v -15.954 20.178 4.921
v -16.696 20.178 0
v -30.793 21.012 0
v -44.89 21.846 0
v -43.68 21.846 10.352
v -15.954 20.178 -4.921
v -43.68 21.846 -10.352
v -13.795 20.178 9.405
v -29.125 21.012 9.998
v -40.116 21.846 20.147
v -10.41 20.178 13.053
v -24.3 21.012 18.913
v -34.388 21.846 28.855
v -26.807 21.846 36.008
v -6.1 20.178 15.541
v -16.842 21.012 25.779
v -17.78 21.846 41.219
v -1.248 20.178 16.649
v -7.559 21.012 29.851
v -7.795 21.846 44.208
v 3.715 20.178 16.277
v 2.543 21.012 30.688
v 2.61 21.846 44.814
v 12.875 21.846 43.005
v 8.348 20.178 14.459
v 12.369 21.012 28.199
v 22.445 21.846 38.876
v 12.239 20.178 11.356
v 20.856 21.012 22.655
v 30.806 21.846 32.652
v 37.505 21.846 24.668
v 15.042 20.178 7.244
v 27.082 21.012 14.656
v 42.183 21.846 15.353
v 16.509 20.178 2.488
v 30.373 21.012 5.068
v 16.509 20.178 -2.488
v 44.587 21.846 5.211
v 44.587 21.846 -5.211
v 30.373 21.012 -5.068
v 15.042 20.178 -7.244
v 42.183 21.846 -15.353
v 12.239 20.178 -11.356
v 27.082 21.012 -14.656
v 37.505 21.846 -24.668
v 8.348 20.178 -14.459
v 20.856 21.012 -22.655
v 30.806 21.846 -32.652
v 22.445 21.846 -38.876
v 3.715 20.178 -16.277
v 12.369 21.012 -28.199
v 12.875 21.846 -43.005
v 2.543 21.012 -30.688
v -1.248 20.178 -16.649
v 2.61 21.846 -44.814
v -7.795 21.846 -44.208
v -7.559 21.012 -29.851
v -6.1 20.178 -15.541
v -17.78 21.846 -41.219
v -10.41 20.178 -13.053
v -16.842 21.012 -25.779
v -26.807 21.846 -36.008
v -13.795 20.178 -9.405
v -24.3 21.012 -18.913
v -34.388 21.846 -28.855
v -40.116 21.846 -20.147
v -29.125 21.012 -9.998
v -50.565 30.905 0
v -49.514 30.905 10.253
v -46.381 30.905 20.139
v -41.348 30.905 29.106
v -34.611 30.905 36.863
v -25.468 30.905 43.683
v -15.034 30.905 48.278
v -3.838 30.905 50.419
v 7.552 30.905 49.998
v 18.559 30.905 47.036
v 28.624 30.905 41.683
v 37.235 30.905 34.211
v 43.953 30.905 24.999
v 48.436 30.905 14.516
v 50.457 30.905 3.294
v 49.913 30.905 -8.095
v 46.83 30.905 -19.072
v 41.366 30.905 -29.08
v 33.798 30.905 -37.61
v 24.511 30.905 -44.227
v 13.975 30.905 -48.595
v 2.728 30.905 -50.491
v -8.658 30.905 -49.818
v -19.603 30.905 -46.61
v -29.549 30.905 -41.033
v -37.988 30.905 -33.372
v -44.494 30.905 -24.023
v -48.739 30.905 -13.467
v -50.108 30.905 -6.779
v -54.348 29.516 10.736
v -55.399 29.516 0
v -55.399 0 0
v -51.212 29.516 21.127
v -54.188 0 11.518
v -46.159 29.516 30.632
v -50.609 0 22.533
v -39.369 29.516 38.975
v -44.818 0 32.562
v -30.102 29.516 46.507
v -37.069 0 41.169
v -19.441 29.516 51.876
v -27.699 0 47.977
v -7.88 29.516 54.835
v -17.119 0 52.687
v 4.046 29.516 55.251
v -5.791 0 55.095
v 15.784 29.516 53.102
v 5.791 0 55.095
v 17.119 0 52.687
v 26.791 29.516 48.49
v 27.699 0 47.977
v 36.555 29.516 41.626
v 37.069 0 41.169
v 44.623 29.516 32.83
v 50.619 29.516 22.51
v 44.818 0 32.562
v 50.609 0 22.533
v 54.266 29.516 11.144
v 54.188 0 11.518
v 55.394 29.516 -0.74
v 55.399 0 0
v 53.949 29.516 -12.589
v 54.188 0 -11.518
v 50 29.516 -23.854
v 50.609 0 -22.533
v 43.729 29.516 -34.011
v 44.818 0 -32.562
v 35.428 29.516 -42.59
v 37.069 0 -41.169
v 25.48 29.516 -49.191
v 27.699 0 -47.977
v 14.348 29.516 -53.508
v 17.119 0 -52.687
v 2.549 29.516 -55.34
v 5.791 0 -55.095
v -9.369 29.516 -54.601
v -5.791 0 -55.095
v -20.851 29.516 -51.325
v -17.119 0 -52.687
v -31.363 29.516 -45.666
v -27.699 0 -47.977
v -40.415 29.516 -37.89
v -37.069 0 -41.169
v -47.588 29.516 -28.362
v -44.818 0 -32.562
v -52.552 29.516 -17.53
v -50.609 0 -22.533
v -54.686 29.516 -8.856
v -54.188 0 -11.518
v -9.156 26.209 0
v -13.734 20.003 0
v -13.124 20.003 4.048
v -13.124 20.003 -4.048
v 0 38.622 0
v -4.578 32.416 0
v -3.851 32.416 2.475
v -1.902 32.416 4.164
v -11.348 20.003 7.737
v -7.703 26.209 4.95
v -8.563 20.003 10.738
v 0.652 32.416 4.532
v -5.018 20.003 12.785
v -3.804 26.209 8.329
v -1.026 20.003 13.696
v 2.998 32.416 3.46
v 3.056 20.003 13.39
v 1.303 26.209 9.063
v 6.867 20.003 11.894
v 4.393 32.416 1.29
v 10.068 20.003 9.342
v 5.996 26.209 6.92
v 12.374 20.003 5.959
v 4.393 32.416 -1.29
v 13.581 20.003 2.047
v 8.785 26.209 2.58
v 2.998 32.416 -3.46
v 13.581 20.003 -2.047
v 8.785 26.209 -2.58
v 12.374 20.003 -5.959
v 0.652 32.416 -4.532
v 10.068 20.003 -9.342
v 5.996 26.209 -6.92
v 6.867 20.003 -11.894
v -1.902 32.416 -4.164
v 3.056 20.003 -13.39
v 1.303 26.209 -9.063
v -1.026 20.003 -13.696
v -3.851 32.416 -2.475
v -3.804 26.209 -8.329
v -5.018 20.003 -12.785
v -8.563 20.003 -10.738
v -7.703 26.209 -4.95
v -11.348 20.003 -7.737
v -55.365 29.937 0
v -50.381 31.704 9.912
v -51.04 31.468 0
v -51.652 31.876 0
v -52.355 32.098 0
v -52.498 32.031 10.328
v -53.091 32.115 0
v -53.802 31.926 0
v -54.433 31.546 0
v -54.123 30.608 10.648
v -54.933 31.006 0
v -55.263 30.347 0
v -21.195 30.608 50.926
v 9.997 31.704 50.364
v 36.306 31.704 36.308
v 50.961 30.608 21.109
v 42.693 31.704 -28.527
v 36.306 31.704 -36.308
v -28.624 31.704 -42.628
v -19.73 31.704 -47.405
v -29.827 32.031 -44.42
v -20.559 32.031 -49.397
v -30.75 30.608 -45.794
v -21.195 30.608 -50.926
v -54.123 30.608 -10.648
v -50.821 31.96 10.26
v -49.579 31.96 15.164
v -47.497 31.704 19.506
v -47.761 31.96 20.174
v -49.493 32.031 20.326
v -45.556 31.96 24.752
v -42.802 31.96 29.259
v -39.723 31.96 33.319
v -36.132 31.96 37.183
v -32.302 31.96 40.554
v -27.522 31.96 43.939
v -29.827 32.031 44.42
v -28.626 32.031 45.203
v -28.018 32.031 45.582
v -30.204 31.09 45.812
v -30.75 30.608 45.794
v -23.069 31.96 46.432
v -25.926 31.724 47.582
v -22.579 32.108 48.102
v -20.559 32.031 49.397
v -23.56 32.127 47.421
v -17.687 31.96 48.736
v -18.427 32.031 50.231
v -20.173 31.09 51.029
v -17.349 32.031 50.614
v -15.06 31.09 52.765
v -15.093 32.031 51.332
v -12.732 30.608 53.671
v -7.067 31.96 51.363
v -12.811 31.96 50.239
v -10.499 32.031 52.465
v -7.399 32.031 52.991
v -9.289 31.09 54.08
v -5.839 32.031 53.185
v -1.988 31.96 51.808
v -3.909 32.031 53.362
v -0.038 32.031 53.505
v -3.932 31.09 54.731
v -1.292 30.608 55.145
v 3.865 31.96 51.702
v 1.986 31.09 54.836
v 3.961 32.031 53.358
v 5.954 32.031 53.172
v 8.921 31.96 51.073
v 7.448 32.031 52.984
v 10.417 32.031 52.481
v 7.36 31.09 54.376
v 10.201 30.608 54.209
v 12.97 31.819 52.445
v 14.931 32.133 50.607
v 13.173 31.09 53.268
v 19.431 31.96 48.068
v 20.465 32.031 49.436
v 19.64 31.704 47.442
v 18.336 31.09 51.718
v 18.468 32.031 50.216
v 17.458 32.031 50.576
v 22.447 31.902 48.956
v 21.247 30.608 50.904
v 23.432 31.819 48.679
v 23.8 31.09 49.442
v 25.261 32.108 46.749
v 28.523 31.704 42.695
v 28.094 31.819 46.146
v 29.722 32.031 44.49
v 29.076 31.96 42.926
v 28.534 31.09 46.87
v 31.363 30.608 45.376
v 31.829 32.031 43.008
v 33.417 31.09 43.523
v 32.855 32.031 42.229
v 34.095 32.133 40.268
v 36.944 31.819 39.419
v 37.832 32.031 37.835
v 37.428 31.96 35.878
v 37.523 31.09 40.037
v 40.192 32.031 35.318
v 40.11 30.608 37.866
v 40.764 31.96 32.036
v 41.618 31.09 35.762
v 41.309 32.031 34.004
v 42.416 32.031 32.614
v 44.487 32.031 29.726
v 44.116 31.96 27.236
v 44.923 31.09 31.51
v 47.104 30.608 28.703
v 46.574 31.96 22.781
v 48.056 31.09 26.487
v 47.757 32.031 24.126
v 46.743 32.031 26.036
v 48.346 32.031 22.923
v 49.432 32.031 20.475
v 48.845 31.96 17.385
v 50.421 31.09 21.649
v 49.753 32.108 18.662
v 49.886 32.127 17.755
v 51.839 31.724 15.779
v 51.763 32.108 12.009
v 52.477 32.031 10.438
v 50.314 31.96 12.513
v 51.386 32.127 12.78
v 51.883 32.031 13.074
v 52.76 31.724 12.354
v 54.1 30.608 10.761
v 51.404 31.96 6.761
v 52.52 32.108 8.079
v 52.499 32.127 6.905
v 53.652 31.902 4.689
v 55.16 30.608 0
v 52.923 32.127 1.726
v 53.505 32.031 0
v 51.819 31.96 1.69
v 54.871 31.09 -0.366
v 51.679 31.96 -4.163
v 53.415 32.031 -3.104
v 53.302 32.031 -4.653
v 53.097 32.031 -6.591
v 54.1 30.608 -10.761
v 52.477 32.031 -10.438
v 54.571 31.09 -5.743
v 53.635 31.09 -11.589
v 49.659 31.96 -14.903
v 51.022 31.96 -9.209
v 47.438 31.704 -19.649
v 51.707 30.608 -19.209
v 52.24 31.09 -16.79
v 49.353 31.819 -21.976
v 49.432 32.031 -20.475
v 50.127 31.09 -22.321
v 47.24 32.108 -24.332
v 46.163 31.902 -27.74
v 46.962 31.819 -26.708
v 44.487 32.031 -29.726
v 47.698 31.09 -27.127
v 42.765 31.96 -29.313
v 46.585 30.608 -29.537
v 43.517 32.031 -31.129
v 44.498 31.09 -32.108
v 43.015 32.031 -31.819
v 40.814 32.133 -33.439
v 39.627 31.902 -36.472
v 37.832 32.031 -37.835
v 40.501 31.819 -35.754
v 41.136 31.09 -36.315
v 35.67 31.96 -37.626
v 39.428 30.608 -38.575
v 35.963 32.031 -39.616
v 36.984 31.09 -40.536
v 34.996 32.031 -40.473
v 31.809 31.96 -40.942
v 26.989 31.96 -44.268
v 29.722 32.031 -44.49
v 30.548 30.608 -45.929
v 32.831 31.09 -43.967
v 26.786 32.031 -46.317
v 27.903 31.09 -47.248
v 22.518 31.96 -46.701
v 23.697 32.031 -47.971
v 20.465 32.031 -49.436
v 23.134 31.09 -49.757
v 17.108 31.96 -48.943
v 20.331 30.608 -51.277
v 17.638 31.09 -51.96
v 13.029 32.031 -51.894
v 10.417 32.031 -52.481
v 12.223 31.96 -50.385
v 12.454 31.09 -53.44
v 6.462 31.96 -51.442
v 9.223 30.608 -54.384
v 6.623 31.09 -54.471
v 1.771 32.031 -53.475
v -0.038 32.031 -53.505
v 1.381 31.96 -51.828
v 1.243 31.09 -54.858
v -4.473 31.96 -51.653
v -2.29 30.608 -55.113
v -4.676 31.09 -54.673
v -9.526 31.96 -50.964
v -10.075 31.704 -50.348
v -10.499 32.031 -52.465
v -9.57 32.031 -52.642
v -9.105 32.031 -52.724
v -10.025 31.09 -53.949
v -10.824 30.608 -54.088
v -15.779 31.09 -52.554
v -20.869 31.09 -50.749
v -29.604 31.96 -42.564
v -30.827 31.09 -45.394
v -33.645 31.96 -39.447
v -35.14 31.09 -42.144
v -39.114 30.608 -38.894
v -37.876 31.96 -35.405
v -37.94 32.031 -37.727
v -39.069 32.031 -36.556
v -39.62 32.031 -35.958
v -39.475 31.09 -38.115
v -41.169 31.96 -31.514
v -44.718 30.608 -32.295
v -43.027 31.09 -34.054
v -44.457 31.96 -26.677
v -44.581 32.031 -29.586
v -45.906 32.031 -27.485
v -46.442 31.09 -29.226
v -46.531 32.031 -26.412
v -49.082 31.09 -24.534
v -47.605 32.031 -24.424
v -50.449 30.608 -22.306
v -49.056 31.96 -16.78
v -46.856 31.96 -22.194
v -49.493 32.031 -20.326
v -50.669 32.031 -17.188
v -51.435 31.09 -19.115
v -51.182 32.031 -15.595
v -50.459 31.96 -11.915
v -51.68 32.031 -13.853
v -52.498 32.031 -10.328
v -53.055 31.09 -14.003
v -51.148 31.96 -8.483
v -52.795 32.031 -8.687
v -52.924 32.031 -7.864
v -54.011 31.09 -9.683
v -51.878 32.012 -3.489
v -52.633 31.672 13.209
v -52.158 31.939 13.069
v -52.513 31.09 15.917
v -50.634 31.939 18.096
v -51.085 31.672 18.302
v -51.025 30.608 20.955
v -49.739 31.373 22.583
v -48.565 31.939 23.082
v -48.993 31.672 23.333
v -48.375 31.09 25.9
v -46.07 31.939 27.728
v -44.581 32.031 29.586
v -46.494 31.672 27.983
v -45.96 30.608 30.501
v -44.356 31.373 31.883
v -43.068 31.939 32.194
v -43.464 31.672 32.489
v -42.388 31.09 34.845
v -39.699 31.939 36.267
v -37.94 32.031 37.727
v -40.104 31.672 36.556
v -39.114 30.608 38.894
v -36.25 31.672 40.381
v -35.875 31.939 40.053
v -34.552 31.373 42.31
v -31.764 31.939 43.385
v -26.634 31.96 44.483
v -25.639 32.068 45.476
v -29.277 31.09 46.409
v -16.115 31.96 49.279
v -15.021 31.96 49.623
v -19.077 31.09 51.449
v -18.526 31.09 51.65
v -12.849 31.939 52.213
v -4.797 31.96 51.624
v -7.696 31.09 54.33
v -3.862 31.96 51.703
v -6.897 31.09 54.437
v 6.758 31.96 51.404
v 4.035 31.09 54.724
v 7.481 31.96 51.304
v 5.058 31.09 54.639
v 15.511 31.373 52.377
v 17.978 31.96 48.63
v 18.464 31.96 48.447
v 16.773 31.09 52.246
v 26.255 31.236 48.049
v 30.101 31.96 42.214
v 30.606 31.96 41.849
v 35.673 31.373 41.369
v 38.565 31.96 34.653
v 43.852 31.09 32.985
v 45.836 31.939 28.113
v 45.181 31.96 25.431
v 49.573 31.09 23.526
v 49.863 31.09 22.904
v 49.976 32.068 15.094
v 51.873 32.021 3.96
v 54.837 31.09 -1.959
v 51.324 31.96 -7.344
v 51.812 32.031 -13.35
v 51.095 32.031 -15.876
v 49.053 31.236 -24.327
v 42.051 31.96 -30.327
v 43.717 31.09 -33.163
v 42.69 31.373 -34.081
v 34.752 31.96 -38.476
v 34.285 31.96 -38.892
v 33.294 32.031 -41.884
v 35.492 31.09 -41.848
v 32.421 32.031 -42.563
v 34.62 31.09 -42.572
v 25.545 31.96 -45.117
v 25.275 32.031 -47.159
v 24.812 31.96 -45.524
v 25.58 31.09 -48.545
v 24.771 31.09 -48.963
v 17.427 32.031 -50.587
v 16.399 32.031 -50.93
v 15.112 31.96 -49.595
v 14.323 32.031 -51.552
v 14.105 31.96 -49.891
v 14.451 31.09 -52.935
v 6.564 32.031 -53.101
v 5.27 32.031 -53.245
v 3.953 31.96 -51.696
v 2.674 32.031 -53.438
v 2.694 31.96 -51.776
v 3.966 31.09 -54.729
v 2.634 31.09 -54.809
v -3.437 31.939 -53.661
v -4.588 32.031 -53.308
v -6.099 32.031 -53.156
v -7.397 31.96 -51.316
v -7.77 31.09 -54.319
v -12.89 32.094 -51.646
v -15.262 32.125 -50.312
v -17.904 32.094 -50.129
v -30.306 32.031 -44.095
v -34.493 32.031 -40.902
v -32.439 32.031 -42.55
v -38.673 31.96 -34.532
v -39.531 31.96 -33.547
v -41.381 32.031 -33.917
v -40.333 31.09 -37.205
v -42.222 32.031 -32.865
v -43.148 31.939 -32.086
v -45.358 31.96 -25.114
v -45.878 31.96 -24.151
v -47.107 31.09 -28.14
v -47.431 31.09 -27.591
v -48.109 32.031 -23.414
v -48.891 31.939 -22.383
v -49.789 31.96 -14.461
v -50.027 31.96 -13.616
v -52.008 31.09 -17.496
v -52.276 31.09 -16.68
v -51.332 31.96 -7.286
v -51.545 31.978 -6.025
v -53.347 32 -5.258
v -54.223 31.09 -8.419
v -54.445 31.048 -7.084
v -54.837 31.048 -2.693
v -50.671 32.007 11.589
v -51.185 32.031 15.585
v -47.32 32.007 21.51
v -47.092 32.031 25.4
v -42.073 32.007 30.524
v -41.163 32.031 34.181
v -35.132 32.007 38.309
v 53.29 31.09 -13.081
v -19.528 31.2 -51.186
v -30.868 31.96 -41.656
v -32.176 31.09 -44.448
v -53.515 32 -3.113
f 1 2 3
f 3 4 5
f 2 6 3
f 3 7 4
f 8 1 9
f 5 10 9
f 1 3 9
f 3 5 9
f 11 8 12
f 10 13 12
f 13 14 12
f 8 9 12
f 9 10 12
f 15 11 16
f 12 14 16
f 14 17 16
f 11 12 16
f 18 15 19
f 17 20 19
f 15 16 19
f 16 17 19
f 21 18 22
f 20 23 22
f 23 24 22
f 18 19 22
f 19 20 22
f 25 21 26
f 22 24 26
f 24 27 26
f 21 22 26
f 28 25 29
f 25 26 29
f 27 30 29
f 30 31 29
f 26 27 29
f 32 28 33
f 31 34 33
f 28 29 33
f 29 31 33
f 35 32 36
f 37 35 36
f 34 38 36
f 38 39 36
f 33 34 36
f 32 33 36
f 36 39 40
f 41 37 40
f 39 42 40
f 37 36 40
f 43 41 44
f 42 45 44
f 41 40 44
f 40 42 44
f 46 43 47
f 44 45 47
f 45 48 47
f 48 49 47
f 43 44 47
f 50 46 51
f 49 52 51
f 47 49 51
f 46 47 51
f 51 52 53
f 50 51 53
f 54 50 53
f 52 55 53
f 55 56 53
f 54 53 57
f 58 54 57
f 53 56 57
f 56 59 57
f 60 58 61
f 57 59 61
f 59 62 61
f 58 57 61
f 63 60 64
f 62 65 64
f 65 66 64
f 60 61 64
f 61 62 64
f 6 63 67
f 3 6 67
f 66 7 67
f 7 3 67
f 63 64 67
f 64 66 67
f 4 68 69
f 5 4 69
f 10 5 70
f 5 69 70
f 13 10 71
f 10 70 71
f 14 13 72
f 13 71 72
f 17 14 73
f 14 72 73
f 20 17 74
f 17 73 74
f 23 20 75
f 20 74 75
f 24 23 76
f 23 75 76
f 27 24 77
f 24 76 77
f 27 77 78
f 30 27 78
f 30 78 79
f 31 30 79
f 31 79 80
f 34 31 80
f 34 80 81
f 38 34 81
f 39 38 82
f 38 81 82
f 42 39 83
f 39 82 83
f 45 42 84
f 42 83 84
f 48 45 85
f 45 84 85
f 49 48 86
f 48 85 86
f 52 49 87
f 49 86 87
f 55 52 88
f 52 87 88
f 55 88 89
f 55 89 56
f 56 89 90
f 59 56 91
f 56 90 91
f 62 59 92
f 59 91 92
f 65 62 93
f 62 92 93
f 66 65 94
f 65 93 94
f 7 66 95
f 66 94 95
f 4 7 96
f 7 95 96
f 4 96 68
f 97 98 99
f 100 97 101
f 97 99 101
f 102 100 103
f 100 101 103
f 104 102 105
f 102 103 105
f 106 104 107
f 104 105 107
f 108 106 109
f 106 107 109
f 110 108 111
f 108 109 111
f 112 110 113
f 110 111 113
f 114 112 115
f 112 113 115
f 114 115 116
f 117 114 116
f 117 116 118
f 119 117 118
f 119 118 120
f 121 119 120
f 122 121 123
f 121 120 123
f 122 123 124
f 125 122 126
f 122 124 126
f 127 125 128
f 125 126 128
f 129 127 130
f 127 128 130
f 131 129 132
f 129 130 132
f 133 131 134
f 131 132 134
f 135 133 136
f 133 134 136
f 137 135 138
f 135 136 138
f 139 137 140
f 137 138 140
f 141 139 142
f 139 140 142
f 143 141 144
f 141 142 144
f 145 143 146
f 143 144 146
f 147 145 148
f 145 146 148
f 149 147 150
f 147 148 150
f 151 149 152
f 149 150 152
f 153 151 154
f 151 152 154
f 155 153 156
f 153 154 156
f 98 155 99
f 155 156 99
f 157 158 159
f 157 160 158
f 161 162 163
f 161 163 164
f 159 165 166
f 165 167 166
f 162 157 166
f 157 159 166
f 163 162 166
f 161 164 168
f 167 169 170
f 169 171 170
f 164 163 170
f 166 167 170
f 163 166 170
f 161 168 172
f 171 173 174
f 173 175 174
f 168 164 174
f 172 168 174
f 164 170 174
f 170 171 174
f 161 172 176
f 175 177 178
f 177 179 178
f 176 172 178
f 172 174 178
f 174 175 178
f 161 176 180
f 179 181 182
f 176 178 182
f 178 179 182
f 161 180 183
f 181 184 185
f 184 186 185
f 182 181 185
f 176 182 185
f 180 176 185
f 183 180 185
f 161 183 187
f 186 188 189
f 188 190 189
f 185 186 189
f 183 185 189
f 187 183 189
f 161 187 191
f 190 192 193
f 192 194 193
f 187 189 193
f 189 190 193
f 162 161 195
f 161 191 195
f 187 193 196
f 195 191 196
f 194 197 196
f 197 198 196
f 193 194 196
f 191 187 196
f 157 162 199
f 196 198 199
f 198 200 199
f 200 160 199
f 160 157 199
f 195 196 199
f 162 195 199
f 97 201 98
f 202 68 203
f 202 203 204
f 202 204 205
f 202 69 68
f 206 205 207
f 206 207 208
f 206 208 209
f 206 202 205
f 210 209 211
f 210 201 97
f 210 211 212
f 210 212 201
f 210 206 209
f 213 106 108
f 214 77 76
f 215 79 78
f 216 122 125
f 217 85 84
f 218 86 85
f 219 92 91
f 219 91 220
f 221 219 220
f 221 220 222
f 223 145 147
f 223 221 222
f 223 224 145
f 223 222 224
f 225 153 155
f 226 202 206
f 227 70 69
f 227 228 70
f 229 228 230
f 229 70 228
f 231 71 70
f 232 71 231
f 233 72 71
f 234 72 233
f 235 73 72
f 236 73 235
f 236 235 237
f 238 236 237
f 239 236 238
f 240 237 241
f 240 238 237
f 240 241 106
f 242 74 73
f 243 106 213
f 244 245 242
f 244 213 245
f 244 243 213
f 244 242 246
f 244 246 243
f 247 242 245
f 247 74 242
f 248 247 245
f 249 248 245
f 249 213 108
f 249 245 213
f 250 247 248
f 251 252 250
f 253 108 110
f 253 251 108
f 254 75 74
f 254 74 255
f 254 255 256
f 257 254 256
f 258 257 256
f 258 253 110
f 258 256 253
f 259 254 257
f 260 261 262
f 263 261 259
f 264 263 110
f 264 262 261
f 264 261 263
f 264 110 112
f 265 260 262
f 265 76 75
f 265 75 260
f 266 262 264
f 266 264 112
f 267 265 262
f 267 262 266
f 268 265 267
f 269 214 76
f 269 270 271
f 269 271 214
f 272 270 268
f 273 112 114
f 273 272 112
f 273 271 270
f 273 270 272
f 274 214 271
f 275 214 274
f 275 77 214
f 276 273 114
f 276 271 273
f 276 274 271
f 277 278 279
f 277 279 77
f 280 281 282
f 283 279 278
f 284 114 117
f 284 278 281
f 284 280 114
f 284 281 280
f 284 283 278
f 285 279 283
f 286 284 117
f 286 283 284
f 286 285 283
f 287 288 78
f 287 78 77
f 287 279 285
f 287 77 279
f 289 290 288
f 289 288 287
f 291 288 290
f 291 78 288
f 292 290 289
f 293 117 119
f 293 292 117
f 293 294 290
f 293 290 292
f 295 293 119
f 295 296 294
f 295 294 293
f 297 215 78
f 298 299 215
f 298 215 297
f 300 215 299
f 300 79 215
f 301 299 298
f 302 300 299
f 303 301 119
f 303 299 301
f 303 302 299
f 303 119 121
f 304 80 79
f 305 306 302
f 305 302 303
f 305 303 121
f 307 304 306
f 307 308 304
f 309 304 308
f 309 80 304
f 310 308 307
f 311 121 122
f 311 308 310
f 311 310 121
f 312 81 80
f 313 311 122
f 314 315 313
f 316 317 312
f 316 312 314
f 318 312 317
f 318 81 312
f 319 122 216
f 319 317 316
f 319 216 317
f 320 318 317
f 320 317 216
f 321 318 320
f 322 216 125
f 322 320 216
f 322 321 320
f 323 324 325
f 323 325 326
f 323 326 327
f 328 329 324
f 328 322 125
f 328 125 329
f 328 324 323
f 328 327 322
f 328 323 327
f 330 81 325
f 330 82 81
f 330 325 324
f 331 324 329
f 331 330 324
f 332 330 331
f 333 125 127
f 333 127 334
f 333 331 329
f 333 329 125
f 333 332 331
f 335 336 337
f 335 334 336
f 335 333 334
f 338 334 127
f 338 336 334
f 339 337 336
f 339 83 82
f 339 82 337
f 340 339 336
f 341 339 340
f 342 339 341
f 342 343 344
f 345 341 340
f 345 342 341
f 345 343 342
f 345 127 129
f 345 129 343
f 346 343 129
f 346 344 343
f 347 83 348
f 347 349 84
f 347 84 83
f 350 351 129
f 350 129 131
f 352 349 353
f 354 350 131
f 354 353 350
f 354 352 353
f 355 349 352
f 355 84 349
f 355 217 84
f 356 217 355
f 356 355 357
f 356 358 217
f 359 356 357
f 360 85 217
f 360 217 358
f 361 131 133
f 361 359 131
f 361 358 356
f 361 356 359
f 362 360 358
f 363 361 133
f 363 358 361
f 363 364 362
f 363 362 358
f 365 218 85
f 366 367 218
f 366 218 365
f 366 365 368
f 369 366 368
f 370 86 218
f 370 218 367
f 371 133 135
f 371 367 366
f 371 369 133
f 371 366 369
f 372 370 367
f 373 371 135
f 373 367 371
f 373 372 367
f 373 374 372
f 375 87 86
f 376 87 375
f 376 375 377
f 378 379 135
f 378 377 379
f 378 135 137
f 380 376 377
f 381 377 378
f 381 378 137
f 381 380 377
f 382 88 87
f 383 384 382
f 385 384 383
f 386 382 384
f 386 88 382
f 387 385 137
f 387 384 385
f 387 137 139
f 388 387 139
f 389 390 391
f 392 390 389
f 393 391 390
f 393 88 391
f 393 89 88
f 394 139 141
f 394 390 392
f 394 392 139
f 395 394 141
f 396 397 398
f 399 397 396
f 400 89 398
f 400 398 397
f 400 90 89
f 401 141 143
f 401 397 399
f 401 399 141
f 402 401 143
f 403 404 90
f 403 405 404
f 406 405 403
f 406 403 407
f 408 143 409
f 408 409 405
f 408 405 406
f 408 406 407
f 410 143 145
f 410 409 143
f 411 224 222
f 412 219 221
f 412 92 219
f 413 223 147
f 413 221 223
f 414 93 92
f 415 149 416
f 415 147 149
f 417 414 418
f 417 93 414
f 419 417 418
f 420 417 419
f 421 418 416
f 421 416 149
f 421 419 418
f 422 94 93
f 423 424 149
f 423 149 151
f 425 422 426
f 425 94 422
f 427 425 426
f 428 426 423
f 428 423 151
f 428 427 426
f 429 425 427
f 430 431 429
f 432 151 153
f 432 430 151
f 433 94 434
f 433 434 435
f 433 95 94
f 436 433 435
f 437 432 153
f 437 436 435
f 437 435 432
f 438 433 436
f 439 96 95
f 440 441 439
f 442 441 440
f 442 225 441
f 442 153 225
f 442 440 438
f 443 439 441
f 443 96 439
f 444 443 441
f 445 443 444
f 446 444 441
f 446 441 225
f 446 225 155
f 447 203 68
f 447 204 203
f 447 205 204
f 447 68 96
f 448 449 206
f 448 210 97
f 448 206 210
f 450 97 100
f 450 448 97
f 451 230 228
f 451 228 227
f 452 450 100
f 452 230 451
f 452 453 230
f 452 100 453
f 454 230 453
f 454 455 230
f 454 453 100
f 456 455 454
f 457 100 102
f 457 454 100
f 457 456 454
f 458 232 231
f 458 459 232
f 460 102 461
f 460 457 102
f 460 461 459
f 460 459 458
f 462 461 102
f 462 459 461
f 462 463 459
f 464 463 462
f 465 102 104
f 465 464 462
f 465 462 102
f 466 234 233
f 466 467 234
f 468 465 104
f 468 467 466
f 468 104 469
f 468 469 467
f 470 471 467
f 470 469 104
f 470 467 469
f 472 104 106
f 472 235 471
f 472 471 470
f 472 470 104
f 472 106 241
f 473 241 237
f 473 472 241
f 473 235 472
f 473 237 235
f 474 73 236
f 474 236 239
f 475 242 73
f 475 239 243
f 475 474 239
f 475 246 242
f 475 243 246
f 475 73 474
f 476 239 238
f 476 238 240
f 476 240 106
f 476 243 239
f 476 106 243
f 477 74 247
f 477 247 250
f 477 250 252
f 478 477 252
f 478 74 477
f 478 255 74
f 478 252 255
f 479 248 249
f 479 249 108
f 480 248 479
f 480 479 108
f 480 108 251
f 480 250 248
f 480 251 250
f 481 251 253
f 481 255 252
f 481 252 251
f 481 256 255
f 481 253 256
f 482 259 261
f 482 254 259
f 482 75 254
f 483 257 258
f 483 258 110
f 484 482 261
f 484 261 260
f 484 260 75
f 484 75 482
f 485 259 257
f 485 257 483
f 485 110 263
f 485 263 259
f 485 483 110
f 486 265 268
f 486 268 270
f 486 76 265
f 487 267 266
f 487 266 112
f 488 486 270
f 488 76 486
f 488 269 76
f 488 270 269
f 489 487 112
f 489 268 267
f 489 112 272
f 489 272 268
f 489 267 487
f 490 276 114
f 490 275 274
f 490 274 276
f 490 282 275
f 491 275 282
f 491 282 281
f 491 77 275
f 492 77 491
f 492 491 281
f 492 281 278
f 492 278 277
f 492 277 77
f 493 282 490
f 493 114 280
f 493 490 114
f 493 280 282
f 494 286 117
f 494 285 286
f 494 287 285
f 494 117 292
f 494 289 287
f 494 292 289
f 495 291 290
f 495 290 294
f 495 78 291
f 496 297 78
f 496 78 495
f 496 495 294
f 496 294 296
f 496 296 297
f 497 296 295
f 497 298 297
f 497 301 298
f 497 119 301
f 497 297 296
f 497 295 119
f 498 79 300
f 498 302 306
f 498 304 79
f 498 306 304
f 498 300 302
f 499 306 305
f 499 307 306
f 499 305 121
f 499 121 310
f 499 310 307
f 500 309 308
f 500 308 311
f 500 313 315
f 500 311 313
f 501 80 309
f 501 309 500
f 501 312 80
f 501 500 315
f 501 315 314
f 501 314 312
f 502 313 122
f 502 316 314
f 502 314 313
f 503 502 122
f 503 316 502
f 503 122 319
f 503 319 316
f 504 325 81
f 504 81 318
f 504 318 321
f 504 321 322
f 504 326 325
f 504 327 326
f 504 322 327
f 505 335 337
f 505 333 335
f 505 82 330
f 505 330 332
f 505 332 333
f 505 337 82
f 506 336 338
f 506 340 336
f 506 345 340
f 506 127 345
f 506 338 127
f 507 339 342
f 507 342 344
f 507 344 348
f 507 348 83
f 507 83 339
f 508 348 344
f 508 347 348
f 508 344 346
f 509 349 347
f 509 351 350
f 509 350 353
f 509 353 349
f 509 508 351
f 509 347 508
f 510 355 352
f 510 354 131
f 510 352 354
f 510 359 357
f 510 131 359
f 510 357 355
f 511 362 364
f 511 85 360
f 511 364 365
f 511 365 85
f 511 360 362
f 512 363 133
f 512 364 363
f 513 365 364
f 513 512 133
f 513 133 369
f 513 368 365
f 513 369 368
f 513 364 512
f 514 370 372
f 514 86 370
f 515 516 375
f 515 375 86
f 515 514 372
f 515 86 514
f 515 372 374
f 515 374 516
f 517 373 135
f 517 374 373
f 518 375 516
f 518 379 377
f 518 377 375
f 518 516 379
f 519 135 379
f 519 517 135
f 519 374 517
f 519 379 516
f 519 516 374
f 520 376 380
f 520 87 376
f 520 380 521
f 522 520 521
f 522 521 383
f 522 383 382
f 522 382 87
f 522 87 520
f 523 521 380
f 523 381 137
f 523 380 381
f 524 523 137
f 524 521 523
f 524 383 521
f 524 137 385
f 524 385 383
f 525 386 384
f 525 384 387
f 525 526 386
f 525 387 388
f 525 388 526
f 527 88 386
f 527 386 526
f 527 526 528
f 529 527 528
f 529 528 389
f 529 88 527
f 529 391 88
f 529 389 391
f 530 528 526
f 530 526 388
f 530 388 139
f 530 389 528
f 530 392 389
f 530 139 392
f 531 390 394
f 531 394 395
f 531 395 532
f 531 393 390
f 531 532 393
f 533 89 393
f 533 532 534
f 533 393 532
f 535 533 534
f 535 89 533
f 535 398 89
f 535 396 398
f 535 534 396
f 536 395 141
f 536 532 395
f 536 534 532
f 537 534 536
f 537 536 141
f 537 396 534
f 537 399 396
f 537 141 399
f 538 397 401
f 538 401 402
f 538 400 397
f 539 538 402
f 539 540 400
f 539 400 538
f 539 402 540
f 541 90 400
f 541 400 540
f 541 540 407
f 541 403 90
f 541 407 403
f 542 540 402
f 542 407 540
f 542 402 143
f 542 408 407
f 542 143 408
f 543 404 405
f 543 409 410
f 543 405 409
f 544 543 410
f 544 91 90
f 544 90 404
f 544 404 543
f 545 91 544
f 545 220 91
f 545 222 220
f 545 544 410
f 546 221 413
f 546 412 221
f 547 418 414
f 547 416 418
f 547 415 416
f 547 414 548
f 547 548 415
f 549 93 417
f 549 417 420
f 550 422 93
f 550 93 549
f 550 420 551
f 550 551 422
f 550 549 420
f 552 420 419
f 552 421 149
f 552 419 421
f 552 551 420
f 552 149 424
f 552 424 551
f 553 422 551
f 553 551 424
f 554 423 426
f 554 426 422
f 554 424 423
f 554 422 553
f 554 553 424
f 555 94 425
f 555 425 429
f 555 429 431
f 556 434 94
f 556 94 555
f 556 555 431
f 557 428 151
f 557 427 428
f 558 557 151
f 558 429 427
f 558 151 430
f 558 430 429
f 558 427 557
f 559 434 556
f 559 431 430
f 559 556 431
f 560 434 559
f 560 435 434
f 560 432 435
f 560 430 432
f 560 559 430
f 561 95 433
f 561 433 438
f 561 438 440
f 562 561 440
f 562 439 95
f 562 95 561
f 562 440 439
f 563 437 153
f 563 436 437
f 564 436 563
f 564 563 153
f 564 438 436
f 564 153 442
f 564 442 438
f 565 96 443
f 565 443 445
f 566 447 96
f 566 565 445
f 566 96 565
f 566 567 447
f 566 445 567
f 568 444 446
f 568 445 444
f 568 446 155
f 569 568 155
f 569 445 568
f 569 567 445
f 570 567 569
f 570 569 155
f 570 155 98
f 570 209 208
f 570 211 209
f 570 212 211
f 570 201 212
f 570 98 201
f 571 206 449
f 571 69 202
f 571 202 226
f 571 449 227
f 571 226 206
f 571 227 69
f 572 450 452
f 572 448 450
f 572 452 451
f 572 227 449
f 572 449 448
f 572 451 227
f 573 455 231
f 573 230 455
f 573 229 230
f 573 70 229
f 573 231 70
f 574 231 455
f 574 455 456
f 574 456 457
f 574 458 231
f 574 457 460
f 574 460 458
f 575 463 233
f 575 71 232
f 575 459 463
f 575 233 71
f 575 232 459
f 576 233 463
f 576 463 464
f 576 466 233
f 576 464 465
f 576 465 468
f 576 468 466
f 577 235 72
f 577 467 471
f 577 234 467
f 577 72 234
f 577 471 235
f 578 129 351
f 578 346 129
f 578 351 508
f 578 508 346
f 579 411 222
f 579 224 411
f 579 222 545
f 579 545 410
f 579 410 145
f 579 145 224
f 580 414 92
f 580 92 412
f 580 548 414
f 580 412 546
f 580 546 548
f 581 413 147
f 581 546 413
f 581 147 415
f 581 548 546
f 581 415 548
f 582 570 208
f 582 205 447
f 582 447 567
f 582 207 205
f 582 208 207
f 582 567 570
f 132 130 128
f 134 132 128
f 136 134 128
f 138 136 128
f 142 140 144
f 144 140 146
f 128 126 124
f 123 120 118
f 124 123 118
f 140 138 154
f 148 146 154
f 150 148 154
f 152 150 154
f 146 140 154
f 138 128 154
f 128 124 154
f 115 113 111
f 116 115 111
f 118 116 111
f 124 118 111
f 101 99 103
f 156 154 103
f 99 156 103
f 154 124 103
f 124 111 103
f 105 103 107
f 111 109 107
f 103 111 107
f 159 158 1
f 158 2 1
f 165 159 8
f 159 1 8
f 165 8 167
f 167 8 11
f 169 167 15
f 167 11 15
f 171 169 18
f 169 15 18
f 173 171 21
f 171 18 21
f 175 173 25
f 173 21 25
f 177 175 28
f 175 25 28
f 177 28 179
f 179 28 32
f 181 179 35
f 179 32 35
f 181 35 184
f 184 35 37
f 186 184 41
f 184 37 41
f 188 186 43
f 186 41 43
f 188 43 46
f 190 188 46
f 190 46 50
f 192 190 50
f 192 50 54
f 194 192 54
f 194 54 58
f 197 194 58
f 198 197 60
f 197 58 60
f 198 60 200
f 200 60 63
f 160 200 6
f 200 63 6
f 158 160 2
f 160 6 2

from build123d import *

# Parameters (mm, degrees)
F2_R = 2.61643


with BuildPart() as f1:
    # F0 (on Top) → F1 (revolve)
    with BuildSketch(Plane.XY):
        Polygon((-55.398632, 0), (0, 0), (0, 38.622338), (-13.734436, 20.002501), (-16.695562, 20.177716), (-44.890404, 21.84605), (-55.398632, 38.622338), align=None)
    revolve(axis=Axis((0, 19.311169, 0), (0, 1, 0)))

    # F2
    f2_edges = [f1.edges().sort_by_distance(p)[0] for p in [
        (55.398632, 38.622338, 0),
    ]]
    fillet(f2_edges, radius=F2_R)


solid = f1.part
